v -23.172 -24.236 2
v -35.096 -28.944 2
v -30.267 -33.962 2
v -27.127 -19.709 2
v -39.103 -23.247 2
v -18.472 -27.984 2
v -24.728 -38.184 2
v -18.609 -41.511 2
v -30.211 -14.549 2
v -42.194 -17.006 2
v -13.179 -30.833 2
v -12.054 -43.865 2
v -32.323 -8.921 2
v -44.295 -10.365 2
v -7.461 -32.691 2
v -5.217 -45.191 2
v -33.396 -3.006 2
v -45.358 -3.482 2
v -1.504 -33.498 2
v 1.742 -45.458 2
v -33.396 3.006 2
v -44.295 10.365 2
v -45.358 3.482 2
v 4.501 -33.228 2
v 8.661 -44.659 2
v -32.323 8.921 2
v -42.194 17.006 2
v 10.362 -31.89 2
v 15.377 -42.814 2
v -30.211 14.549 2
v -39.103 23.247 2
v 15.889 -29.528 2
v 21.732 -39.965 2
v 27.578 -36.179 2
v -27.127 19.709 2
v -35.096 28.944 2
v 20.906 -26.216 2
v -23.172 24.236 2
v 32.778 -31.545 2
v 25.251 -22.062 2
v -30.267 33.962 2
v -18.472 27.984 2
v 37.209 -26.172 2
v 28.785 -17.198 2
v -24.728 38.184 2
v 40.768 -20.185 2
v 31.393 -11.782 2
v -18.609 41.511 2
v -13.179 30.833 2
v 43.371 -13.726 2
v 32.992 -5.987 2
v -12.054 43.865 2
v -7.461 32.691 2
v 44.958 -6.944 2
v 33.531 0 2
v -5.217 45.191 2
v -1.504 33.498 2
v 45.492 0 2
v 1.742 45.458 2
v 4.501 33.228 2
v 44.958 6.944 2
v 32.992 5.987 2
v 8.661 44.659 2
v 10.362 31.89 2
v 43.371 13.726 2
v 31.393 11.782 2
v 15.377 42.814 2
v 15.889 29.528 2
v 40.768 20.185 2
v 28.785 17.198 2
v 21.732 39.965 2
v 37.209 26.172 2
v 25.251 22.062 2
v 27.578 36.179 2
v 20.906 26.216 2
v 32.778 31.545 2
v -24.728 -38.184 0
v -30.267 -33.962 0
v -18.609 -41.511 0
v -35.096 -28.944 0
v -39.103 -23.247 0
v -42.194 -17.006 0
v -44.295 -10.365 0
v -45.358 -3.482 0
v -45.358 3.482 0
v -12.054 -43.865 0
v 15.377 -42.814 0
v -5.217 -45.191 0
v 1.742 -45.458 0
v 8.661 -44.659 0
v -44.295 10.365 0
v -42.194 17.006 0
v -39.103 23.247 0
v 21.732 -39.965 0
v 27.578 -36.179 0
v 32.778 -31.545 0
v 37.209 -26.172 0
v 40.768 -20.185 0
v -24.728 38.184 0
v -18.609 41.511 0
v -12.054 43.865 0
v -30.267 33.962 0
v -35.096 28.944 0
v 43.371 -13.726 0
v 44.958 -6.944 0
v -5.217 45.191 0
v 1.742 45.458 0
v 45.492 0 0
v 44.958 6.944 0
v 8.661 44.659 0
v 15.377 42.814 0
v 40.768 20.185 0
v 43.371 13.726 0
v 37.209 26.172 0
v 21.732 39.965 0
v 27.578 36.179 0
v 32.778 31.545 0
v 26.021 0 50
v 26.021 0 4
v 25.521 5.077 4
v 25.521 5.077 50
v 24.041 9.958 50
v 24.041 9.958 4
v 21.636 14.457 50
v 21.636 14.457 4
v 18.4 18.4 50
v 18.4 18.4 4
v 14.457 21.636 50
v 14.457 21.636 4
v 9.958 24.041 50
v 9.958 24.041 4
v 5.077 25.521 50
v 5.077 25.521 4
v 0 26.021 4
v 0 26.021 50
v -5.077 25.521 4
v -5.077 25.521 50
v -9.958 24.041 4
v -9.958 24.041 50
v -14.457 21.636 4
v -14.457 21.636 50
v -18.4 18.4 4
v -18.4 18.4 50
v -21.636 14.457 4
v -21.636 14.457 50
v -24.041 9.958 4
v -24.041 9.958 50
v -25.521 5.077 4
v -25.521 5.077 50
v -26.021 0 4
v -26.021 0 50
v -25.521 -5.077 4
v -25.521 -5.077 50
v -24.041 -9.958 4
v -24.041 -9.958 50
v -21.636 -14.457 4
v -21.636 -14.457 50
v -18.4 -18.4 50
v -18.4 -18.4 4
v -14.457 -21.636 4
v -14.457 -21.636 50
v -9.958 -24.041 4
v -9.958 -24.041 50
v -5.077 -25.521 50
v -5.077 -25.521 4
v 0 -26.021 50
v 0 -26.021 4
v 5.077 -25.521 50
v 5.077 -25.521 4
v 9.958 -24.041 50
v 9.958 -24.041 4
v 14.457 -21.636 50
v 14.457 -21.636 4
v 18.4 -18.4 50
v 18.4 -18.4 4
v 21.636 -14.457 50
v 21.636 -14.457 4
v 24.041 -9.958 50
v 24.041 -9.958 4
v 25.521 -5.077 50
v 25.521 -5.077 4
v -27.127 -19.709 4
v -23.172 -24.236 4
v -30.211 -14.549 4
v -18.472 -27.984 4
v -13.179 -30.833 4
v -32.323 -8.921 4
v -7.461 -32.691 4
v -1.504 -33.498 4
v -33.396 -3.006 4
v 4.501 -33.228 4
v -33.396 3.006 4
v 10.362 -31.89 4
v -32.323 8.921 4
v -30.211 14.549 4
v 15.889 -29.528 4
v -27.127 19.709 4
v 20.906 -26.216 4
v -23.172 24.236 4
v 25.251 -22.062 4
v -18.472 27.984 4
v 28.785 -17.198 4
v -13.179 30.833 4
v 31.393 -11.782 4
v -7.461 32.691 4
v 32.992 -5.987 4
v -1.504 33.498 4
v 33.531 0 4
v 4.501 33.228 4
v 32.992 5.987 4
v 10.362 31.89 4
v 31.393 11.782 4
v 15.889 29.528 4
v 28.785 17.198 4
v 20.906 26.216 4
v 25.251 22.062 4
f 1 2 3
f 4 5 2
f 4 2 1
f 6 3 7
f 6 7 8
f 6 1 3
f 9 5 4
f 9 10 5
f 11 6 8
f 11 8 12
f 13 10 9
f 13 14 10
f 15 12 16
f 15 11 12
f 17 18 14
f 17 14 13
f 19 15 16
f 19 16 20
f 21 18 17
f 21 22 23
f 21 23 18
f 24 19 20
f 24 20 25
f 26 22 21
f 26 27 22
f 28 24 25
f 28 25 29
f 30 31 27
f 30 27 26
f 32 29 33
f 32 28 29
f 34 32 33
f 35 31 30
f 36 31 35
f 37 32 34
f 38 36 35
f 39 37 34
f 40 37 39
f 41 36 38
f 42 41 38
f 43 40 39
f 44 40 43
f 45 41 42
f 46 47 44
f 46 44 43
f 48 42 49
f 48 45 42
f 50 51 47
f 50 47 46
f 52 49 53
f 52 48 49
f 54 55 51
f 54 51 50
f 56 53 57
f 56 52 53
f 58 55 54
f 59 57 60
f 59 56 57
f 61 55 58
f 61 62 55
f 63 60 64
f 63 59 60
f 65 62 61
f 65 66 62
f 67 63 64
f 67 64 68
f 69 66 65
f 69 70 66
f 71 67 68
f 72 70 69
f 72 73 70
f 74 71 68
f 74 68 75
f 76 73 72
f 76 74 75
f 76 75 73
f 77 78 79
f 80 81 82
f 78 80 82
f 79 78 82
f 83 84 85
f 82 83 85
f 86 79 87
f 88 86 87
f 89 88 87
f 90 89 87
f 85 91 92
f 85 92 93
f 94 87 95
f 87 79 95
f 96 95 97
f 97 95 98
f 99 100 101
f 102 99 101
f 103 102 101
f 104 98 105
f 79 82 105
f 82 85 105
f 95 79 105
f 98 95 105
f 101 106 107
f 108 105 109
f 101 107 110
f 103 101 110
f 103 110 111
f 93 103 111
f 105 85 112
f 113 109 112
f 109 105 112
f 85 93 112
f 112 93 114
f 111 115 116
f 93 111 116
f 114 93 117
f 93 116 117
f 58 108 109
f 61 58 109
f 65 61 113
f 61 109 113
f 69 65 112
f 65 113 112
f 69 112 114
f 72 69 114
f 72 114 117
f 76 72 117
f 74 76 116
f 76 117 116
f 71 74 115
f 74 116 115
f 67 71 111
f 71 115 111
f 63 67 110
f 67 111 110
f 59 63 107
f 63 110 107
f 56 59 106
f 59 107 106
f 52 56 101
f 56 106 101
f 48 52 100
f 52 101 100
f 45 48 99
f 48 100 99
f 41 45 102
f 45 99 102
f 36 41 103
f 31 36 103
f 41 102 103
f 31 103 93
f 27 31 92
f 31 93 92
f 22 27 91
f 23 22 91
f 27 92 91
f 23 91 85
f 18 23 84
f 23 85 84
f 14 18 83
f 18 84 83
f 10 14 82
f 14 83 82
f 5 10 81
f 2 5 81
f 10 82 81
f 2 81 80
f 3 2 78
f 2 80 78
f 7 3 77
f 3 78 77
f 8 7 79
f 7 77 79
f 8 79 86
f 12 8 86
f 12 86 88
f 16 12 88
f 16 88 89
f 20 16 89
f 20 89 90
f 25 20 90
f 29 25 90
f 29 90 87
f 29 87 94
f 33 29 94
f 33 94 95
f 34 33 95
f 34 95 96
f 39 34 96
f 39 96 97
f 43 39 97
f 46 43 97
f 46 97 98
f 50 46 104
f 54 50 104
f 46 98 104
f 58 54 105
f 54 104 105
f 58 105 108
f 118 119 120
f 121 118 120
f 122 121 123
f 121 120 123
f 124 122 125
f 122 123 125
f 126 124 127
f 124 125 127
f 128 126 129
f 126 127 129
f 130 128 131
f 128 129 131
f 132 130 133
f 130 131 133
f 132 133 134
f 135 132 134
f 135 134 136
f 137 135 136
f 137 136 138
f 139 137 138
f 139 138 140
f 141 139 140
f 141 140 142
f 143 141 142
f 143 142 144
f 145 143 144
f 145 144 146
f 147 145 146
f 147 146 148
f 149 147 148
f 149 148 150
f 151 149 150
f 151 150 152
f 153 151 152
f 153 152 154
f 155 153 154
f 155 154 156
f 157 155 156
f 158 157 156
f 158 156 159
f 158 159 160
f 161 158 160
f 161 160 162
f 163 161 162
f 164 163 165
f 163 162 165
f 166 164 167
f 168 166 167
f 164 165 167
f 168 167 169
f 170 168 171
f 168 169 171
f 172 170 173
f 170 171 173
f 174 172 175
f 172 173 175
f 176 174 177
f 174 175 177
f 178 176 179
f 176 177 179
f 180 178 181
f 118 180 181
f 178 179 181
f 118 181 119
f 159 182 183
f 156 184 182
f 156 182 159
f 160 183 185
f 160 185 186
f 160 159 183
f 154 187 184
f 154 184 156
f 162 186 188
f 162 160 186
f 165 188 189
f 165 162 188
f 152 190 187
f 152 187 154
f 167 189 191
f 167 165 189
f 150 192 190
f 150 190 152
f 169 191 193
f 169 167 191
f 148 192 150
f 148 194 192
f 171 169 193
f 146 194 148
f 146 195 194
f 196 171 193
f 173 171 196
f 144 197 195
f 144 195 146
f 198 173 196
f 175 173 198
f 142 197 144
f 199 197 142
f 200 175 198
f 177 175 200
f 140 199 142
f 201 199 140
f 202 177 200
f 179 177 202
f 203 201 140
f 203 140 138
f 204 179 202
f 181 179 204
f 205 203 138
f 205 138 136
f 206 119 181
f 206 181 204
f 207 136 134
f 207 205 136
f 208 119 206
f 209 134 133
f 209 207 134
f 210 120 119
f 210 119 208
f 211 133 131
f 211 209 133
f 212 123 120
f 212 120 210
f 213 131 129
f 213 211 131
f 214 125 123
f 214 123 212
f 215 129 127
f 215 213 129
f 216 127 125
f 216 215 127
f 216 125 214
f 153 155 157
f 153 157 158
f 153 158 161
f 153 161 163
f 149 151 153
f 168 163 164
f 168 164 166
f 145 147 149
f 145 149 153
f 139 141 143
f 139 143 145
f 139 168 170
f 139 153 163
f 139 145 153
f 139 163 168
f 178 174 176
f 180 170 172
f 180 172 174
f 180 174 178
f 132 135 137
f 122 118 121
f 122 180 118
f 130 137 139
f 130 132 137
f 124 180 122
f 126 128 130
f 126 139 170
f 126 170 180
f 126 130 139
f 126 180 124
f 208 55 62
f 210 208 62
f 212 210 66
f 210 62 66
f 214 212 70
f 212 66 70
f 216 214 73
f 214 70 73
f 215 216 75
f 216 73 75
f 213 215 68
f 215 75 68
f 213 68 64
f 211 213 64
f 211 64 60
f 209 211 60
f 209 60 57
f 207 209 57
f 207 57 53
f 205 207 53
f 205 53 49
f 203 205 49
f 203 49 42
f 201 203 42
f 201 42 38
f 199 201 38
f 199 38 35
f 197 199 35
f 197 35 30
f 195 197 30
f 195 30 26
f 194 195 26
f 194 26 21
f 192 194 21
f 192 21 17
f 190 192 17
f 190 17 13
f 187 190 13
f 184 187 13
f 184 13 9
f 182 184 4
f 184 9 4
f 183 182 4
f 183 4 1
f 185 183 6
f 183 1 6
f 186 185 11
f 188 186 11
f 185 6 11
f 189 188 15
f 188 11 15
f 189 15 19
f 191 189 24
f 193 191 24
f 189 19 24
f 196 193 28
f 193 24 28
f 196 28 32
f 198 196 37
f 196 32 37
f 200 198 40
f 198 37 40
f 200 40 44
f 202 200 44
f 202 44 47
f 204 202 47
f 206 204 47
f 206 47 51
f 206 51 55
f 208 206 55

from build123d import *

# Parameters (mm, degrees)
F0_R     = 45.491537
F3_DEPTH = 2
F1_R     = 33.53132
F4_DEPTH = 4
F2_R     = 26.021397
F5_DEPTH = 50


with BuildPart() as f3:
    # F0 (on Top) → F3 (new body)
    with BuildSketch(Plane.XY):
        Circle(F0_R)
    extrude(amount=F3_DEPTH)

    # F1 (on Top) → F4 (join)
    with BuildSketch(Plane.XY):
        Circle(F1_R)
    extrude(amount=F4_DEPTH)

    # F2 (on Top) → F5 (join)
    with BuildSketch(Plane.XY):
        Circle(F2_R)
    extrude(amount=F5_DEPTH)


solid = f3.part
